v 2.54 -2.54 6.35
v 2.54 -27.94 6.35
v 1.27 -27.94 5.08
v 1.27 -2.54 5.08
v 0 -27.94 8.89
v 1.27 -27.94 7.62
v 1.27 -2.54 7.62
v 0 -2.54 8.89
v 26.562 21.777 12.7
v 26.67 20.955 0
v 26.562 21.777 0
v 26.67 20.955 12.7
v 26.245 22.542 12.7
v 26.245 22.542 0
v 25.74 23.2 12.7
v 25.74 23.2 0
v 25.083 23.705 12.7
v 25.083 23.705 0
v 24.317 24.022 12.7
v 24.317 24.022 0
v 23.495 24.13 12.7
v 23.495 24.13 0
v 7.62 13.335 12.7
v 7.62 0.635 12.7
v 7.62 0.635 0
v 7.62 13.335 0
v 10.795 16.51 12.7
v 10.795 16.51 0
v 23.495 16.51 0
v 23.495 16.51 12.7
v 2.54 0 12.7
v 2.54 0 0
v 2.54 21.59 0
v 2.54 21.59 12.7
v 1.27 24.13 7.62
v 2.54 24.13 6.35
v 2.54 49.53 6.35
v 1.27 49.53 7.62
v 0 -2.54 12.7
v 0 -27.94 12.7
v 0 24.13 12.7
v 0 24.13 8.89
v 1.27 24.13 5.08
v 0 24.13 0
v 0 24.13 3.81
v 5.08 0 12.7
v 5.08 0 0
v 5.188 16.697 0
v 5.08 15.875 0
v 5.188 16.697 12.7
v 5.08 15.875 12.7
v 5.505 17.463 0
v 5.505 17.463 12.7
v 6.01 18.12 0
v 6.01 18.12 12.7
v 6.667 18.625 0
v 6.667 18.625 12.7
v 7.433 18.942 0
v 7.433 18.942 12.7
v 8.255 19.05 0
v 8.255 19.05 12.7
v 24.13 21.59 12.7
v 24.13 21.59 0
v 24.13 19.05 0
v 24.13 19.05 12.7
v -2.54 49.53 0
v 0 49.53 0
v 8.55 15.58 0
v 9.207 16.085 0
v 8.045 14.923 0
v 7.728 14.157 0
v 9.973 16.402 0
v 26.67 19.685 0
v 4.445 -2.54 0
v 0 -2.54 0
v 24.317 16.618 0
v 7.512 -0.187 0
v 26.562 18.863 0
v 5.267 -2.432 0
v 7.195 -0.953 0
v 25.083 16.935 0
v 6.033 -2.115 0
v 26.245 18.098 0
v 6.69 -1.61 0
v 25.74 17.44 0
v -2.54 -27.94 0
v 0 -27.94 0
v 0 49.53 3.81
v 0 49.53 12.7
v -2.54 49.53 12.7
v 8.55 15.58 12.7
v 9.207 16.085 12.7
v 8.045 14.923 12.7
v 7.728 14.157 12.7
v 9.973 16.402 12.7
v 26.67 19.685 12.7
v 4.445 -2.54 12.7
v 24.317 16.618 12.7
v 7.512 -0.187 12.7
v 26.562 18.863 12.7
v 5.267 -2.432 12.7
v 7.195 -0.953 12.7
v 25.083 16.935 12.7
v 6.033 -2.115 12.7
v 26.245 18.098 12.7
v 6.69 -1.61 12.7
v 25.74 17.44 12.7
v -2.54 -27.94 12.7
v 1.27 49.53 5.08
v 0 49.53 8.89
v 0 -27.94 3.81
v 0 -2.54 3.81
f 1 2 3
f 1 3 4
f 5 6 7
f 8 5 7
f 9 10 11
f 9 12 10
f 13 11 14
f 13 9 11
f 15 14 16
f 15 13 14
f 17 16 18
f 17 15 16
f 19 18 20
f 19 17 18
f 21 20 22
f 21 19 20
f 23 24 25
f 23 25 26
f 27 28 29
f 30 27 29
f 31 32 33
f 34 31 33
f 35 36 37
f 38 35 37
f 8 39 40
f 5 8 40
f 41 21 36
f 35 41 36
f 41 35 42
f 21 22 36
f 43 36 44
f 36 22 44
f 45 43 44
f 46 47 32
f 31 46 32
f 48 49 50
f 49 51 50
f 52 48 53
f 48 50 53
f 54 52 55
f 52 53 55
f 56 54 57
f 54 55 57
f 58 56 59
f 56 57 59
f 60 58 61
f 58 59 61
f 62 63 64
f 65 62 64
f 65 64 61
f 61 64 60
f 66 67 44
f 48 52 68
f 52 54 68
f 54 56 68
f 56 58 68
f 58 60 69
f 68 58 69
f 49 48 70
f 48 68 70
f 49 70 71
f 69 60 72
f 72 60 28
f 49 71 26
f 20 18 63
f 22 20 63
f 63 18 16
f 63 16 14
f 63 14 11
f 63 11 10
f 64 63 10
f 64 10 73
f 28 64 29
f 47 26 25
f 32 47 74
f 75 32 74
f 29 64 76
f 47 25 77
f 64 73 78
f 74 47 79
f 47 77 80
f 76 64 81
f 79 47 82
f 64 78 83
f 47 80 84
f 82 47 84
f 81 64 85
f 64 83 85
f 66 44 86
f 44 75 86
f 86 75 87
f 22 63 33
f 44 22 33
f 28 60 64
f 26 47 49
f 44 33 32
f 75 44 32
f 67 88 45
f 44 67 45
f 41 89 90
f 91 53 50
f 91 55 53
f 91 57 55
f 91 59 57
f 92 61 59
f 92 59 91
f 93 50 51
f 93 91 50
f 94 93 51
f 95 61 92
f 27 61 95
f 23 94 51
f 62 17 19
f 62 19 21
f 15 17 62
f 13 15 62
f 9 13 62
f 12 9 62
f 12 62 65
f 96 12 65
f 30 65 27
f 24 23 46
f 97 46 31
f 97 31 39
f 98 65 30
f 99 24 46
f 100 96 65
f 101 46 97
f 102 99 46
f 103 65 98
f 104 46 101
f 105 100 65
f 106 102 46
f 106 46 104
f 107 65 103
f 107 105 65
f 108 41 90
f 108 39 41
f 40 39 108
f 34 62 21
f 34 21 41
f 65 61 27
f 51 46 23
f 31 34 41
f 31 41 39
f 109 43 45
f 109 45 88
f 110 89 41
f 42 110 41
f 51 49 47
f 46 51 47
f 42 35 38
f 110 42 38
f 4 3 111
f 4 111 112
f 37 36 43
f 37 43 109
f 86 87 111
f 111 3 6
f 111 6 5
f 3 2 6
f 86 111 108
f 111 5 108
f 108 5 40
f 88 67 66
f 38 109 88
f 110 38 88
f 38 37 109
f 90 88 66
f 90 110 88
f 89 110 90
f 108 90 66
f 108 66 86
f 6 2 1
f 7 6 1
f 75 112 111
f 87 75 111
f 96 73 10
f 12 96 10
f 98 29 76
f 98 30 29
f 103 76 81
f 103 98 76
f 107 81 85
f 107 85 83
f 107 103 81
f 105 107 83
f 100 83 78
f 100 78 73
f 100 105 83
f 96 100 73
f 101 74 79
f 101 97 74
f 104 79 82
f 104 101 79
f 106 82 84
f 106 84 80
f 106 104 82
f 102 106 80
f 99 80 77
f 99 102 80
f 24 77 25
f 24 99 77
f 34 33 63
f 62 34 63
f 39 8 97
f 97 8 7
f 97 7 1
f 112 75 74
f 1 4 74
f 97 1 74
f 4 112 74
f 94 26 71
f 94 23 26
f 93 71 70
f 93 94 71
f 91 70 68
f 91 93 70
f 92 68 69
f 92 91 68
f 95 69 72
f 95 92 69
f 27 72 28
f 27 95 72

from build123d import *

# Parameters (mm, degrees)
F1_DEPTH = 12.7
F2_R     = 3.175
F3_W     = 77.47
F3_H     = 12.7
F4_DEPTH = 2.54
F5_W     = 25.4
F5_H     = 2.54
F6_DEPTH = 2.54
F7_SIZE  = 1.26999


# Not quite as in the source:
# - a fillet or chamfer is up to 0.001 mm smaller than in the source, because OpenCascade refuses the exact size


with BuildPart() as f1:
    # F0 (on Top) → F1 (new body)
    with BuildSketch(Plane.XY):
        Polygon((0, 24.13), (0, -2.1948770154), (0, -2.54), (7.62, -2.54), (7.62, 16.51), (26.67, 16.51), (26.67, 24.13), align=None)
        Polygon((5.08, 0), (2.54, 0), (2.54, 21.59), (5.08, 21.59), (24.13, 21.59), (24.13, 19.05), (5.08, 19.05), align=None, mode=Mode.SUBTRACT)
    extrude(amount=F1_DEPTH)

    # F2
    f2_edges = [f1.edges().sort_by_distance(p)[0] for p in [
        (26.67, 24.13, 6.35),
        (26.67, 16.51, 6.35),
        (5.08, 19.05, 6.35),
        (7.62, -2.54, 6.35),
        (7.62, 16.51, 6.35),
    ]]
    fillet(f2_edges, radius=F2_R)

    # F3 (on face) → F4 (join)
    with BuildSketch(Plane(origin=(0, 0, 0), x_dir=(0, -1, 0), z_dir=(-1, 0, 0))):
        with Locations((-10.795, 6.35)):
            Rectangle(F3_W, F3_H)
    extrude(amount=F4_DEPTH)

    # F5 (on face) → F6 (join)
    with BuildSketch(Plane.YZ):
        with Locations((36.83, 6.35)):
            Rectangle(F5_W, F5_H)
        with Locations((-15.24, 6.35)):
            Rectangle(F5_W, F5_H)
    extrude(amount=F6_DEPTH)

    # F7 (size 1.27 in the source; OpenCascade refuses exactly that, so slightly less here)
    f7_edges = [f1.edges().sort_by_distance(p)[0] for p in [
        (2.54, -15.24, 5.08),
        (2.54, -15.24, 7.62),
        (2.54, 36.83, 7.62),
        (2.54, 36.83, 5.08),
        (0, -15.24, 5.08),
        (0, -15.24, 7.62),
        (0, 36.83, 7.62),
        (0, 36.83, 5.08),
    ]]
    chamfer(f7_edges, length=F7_SIZE)


solid = f1.part
